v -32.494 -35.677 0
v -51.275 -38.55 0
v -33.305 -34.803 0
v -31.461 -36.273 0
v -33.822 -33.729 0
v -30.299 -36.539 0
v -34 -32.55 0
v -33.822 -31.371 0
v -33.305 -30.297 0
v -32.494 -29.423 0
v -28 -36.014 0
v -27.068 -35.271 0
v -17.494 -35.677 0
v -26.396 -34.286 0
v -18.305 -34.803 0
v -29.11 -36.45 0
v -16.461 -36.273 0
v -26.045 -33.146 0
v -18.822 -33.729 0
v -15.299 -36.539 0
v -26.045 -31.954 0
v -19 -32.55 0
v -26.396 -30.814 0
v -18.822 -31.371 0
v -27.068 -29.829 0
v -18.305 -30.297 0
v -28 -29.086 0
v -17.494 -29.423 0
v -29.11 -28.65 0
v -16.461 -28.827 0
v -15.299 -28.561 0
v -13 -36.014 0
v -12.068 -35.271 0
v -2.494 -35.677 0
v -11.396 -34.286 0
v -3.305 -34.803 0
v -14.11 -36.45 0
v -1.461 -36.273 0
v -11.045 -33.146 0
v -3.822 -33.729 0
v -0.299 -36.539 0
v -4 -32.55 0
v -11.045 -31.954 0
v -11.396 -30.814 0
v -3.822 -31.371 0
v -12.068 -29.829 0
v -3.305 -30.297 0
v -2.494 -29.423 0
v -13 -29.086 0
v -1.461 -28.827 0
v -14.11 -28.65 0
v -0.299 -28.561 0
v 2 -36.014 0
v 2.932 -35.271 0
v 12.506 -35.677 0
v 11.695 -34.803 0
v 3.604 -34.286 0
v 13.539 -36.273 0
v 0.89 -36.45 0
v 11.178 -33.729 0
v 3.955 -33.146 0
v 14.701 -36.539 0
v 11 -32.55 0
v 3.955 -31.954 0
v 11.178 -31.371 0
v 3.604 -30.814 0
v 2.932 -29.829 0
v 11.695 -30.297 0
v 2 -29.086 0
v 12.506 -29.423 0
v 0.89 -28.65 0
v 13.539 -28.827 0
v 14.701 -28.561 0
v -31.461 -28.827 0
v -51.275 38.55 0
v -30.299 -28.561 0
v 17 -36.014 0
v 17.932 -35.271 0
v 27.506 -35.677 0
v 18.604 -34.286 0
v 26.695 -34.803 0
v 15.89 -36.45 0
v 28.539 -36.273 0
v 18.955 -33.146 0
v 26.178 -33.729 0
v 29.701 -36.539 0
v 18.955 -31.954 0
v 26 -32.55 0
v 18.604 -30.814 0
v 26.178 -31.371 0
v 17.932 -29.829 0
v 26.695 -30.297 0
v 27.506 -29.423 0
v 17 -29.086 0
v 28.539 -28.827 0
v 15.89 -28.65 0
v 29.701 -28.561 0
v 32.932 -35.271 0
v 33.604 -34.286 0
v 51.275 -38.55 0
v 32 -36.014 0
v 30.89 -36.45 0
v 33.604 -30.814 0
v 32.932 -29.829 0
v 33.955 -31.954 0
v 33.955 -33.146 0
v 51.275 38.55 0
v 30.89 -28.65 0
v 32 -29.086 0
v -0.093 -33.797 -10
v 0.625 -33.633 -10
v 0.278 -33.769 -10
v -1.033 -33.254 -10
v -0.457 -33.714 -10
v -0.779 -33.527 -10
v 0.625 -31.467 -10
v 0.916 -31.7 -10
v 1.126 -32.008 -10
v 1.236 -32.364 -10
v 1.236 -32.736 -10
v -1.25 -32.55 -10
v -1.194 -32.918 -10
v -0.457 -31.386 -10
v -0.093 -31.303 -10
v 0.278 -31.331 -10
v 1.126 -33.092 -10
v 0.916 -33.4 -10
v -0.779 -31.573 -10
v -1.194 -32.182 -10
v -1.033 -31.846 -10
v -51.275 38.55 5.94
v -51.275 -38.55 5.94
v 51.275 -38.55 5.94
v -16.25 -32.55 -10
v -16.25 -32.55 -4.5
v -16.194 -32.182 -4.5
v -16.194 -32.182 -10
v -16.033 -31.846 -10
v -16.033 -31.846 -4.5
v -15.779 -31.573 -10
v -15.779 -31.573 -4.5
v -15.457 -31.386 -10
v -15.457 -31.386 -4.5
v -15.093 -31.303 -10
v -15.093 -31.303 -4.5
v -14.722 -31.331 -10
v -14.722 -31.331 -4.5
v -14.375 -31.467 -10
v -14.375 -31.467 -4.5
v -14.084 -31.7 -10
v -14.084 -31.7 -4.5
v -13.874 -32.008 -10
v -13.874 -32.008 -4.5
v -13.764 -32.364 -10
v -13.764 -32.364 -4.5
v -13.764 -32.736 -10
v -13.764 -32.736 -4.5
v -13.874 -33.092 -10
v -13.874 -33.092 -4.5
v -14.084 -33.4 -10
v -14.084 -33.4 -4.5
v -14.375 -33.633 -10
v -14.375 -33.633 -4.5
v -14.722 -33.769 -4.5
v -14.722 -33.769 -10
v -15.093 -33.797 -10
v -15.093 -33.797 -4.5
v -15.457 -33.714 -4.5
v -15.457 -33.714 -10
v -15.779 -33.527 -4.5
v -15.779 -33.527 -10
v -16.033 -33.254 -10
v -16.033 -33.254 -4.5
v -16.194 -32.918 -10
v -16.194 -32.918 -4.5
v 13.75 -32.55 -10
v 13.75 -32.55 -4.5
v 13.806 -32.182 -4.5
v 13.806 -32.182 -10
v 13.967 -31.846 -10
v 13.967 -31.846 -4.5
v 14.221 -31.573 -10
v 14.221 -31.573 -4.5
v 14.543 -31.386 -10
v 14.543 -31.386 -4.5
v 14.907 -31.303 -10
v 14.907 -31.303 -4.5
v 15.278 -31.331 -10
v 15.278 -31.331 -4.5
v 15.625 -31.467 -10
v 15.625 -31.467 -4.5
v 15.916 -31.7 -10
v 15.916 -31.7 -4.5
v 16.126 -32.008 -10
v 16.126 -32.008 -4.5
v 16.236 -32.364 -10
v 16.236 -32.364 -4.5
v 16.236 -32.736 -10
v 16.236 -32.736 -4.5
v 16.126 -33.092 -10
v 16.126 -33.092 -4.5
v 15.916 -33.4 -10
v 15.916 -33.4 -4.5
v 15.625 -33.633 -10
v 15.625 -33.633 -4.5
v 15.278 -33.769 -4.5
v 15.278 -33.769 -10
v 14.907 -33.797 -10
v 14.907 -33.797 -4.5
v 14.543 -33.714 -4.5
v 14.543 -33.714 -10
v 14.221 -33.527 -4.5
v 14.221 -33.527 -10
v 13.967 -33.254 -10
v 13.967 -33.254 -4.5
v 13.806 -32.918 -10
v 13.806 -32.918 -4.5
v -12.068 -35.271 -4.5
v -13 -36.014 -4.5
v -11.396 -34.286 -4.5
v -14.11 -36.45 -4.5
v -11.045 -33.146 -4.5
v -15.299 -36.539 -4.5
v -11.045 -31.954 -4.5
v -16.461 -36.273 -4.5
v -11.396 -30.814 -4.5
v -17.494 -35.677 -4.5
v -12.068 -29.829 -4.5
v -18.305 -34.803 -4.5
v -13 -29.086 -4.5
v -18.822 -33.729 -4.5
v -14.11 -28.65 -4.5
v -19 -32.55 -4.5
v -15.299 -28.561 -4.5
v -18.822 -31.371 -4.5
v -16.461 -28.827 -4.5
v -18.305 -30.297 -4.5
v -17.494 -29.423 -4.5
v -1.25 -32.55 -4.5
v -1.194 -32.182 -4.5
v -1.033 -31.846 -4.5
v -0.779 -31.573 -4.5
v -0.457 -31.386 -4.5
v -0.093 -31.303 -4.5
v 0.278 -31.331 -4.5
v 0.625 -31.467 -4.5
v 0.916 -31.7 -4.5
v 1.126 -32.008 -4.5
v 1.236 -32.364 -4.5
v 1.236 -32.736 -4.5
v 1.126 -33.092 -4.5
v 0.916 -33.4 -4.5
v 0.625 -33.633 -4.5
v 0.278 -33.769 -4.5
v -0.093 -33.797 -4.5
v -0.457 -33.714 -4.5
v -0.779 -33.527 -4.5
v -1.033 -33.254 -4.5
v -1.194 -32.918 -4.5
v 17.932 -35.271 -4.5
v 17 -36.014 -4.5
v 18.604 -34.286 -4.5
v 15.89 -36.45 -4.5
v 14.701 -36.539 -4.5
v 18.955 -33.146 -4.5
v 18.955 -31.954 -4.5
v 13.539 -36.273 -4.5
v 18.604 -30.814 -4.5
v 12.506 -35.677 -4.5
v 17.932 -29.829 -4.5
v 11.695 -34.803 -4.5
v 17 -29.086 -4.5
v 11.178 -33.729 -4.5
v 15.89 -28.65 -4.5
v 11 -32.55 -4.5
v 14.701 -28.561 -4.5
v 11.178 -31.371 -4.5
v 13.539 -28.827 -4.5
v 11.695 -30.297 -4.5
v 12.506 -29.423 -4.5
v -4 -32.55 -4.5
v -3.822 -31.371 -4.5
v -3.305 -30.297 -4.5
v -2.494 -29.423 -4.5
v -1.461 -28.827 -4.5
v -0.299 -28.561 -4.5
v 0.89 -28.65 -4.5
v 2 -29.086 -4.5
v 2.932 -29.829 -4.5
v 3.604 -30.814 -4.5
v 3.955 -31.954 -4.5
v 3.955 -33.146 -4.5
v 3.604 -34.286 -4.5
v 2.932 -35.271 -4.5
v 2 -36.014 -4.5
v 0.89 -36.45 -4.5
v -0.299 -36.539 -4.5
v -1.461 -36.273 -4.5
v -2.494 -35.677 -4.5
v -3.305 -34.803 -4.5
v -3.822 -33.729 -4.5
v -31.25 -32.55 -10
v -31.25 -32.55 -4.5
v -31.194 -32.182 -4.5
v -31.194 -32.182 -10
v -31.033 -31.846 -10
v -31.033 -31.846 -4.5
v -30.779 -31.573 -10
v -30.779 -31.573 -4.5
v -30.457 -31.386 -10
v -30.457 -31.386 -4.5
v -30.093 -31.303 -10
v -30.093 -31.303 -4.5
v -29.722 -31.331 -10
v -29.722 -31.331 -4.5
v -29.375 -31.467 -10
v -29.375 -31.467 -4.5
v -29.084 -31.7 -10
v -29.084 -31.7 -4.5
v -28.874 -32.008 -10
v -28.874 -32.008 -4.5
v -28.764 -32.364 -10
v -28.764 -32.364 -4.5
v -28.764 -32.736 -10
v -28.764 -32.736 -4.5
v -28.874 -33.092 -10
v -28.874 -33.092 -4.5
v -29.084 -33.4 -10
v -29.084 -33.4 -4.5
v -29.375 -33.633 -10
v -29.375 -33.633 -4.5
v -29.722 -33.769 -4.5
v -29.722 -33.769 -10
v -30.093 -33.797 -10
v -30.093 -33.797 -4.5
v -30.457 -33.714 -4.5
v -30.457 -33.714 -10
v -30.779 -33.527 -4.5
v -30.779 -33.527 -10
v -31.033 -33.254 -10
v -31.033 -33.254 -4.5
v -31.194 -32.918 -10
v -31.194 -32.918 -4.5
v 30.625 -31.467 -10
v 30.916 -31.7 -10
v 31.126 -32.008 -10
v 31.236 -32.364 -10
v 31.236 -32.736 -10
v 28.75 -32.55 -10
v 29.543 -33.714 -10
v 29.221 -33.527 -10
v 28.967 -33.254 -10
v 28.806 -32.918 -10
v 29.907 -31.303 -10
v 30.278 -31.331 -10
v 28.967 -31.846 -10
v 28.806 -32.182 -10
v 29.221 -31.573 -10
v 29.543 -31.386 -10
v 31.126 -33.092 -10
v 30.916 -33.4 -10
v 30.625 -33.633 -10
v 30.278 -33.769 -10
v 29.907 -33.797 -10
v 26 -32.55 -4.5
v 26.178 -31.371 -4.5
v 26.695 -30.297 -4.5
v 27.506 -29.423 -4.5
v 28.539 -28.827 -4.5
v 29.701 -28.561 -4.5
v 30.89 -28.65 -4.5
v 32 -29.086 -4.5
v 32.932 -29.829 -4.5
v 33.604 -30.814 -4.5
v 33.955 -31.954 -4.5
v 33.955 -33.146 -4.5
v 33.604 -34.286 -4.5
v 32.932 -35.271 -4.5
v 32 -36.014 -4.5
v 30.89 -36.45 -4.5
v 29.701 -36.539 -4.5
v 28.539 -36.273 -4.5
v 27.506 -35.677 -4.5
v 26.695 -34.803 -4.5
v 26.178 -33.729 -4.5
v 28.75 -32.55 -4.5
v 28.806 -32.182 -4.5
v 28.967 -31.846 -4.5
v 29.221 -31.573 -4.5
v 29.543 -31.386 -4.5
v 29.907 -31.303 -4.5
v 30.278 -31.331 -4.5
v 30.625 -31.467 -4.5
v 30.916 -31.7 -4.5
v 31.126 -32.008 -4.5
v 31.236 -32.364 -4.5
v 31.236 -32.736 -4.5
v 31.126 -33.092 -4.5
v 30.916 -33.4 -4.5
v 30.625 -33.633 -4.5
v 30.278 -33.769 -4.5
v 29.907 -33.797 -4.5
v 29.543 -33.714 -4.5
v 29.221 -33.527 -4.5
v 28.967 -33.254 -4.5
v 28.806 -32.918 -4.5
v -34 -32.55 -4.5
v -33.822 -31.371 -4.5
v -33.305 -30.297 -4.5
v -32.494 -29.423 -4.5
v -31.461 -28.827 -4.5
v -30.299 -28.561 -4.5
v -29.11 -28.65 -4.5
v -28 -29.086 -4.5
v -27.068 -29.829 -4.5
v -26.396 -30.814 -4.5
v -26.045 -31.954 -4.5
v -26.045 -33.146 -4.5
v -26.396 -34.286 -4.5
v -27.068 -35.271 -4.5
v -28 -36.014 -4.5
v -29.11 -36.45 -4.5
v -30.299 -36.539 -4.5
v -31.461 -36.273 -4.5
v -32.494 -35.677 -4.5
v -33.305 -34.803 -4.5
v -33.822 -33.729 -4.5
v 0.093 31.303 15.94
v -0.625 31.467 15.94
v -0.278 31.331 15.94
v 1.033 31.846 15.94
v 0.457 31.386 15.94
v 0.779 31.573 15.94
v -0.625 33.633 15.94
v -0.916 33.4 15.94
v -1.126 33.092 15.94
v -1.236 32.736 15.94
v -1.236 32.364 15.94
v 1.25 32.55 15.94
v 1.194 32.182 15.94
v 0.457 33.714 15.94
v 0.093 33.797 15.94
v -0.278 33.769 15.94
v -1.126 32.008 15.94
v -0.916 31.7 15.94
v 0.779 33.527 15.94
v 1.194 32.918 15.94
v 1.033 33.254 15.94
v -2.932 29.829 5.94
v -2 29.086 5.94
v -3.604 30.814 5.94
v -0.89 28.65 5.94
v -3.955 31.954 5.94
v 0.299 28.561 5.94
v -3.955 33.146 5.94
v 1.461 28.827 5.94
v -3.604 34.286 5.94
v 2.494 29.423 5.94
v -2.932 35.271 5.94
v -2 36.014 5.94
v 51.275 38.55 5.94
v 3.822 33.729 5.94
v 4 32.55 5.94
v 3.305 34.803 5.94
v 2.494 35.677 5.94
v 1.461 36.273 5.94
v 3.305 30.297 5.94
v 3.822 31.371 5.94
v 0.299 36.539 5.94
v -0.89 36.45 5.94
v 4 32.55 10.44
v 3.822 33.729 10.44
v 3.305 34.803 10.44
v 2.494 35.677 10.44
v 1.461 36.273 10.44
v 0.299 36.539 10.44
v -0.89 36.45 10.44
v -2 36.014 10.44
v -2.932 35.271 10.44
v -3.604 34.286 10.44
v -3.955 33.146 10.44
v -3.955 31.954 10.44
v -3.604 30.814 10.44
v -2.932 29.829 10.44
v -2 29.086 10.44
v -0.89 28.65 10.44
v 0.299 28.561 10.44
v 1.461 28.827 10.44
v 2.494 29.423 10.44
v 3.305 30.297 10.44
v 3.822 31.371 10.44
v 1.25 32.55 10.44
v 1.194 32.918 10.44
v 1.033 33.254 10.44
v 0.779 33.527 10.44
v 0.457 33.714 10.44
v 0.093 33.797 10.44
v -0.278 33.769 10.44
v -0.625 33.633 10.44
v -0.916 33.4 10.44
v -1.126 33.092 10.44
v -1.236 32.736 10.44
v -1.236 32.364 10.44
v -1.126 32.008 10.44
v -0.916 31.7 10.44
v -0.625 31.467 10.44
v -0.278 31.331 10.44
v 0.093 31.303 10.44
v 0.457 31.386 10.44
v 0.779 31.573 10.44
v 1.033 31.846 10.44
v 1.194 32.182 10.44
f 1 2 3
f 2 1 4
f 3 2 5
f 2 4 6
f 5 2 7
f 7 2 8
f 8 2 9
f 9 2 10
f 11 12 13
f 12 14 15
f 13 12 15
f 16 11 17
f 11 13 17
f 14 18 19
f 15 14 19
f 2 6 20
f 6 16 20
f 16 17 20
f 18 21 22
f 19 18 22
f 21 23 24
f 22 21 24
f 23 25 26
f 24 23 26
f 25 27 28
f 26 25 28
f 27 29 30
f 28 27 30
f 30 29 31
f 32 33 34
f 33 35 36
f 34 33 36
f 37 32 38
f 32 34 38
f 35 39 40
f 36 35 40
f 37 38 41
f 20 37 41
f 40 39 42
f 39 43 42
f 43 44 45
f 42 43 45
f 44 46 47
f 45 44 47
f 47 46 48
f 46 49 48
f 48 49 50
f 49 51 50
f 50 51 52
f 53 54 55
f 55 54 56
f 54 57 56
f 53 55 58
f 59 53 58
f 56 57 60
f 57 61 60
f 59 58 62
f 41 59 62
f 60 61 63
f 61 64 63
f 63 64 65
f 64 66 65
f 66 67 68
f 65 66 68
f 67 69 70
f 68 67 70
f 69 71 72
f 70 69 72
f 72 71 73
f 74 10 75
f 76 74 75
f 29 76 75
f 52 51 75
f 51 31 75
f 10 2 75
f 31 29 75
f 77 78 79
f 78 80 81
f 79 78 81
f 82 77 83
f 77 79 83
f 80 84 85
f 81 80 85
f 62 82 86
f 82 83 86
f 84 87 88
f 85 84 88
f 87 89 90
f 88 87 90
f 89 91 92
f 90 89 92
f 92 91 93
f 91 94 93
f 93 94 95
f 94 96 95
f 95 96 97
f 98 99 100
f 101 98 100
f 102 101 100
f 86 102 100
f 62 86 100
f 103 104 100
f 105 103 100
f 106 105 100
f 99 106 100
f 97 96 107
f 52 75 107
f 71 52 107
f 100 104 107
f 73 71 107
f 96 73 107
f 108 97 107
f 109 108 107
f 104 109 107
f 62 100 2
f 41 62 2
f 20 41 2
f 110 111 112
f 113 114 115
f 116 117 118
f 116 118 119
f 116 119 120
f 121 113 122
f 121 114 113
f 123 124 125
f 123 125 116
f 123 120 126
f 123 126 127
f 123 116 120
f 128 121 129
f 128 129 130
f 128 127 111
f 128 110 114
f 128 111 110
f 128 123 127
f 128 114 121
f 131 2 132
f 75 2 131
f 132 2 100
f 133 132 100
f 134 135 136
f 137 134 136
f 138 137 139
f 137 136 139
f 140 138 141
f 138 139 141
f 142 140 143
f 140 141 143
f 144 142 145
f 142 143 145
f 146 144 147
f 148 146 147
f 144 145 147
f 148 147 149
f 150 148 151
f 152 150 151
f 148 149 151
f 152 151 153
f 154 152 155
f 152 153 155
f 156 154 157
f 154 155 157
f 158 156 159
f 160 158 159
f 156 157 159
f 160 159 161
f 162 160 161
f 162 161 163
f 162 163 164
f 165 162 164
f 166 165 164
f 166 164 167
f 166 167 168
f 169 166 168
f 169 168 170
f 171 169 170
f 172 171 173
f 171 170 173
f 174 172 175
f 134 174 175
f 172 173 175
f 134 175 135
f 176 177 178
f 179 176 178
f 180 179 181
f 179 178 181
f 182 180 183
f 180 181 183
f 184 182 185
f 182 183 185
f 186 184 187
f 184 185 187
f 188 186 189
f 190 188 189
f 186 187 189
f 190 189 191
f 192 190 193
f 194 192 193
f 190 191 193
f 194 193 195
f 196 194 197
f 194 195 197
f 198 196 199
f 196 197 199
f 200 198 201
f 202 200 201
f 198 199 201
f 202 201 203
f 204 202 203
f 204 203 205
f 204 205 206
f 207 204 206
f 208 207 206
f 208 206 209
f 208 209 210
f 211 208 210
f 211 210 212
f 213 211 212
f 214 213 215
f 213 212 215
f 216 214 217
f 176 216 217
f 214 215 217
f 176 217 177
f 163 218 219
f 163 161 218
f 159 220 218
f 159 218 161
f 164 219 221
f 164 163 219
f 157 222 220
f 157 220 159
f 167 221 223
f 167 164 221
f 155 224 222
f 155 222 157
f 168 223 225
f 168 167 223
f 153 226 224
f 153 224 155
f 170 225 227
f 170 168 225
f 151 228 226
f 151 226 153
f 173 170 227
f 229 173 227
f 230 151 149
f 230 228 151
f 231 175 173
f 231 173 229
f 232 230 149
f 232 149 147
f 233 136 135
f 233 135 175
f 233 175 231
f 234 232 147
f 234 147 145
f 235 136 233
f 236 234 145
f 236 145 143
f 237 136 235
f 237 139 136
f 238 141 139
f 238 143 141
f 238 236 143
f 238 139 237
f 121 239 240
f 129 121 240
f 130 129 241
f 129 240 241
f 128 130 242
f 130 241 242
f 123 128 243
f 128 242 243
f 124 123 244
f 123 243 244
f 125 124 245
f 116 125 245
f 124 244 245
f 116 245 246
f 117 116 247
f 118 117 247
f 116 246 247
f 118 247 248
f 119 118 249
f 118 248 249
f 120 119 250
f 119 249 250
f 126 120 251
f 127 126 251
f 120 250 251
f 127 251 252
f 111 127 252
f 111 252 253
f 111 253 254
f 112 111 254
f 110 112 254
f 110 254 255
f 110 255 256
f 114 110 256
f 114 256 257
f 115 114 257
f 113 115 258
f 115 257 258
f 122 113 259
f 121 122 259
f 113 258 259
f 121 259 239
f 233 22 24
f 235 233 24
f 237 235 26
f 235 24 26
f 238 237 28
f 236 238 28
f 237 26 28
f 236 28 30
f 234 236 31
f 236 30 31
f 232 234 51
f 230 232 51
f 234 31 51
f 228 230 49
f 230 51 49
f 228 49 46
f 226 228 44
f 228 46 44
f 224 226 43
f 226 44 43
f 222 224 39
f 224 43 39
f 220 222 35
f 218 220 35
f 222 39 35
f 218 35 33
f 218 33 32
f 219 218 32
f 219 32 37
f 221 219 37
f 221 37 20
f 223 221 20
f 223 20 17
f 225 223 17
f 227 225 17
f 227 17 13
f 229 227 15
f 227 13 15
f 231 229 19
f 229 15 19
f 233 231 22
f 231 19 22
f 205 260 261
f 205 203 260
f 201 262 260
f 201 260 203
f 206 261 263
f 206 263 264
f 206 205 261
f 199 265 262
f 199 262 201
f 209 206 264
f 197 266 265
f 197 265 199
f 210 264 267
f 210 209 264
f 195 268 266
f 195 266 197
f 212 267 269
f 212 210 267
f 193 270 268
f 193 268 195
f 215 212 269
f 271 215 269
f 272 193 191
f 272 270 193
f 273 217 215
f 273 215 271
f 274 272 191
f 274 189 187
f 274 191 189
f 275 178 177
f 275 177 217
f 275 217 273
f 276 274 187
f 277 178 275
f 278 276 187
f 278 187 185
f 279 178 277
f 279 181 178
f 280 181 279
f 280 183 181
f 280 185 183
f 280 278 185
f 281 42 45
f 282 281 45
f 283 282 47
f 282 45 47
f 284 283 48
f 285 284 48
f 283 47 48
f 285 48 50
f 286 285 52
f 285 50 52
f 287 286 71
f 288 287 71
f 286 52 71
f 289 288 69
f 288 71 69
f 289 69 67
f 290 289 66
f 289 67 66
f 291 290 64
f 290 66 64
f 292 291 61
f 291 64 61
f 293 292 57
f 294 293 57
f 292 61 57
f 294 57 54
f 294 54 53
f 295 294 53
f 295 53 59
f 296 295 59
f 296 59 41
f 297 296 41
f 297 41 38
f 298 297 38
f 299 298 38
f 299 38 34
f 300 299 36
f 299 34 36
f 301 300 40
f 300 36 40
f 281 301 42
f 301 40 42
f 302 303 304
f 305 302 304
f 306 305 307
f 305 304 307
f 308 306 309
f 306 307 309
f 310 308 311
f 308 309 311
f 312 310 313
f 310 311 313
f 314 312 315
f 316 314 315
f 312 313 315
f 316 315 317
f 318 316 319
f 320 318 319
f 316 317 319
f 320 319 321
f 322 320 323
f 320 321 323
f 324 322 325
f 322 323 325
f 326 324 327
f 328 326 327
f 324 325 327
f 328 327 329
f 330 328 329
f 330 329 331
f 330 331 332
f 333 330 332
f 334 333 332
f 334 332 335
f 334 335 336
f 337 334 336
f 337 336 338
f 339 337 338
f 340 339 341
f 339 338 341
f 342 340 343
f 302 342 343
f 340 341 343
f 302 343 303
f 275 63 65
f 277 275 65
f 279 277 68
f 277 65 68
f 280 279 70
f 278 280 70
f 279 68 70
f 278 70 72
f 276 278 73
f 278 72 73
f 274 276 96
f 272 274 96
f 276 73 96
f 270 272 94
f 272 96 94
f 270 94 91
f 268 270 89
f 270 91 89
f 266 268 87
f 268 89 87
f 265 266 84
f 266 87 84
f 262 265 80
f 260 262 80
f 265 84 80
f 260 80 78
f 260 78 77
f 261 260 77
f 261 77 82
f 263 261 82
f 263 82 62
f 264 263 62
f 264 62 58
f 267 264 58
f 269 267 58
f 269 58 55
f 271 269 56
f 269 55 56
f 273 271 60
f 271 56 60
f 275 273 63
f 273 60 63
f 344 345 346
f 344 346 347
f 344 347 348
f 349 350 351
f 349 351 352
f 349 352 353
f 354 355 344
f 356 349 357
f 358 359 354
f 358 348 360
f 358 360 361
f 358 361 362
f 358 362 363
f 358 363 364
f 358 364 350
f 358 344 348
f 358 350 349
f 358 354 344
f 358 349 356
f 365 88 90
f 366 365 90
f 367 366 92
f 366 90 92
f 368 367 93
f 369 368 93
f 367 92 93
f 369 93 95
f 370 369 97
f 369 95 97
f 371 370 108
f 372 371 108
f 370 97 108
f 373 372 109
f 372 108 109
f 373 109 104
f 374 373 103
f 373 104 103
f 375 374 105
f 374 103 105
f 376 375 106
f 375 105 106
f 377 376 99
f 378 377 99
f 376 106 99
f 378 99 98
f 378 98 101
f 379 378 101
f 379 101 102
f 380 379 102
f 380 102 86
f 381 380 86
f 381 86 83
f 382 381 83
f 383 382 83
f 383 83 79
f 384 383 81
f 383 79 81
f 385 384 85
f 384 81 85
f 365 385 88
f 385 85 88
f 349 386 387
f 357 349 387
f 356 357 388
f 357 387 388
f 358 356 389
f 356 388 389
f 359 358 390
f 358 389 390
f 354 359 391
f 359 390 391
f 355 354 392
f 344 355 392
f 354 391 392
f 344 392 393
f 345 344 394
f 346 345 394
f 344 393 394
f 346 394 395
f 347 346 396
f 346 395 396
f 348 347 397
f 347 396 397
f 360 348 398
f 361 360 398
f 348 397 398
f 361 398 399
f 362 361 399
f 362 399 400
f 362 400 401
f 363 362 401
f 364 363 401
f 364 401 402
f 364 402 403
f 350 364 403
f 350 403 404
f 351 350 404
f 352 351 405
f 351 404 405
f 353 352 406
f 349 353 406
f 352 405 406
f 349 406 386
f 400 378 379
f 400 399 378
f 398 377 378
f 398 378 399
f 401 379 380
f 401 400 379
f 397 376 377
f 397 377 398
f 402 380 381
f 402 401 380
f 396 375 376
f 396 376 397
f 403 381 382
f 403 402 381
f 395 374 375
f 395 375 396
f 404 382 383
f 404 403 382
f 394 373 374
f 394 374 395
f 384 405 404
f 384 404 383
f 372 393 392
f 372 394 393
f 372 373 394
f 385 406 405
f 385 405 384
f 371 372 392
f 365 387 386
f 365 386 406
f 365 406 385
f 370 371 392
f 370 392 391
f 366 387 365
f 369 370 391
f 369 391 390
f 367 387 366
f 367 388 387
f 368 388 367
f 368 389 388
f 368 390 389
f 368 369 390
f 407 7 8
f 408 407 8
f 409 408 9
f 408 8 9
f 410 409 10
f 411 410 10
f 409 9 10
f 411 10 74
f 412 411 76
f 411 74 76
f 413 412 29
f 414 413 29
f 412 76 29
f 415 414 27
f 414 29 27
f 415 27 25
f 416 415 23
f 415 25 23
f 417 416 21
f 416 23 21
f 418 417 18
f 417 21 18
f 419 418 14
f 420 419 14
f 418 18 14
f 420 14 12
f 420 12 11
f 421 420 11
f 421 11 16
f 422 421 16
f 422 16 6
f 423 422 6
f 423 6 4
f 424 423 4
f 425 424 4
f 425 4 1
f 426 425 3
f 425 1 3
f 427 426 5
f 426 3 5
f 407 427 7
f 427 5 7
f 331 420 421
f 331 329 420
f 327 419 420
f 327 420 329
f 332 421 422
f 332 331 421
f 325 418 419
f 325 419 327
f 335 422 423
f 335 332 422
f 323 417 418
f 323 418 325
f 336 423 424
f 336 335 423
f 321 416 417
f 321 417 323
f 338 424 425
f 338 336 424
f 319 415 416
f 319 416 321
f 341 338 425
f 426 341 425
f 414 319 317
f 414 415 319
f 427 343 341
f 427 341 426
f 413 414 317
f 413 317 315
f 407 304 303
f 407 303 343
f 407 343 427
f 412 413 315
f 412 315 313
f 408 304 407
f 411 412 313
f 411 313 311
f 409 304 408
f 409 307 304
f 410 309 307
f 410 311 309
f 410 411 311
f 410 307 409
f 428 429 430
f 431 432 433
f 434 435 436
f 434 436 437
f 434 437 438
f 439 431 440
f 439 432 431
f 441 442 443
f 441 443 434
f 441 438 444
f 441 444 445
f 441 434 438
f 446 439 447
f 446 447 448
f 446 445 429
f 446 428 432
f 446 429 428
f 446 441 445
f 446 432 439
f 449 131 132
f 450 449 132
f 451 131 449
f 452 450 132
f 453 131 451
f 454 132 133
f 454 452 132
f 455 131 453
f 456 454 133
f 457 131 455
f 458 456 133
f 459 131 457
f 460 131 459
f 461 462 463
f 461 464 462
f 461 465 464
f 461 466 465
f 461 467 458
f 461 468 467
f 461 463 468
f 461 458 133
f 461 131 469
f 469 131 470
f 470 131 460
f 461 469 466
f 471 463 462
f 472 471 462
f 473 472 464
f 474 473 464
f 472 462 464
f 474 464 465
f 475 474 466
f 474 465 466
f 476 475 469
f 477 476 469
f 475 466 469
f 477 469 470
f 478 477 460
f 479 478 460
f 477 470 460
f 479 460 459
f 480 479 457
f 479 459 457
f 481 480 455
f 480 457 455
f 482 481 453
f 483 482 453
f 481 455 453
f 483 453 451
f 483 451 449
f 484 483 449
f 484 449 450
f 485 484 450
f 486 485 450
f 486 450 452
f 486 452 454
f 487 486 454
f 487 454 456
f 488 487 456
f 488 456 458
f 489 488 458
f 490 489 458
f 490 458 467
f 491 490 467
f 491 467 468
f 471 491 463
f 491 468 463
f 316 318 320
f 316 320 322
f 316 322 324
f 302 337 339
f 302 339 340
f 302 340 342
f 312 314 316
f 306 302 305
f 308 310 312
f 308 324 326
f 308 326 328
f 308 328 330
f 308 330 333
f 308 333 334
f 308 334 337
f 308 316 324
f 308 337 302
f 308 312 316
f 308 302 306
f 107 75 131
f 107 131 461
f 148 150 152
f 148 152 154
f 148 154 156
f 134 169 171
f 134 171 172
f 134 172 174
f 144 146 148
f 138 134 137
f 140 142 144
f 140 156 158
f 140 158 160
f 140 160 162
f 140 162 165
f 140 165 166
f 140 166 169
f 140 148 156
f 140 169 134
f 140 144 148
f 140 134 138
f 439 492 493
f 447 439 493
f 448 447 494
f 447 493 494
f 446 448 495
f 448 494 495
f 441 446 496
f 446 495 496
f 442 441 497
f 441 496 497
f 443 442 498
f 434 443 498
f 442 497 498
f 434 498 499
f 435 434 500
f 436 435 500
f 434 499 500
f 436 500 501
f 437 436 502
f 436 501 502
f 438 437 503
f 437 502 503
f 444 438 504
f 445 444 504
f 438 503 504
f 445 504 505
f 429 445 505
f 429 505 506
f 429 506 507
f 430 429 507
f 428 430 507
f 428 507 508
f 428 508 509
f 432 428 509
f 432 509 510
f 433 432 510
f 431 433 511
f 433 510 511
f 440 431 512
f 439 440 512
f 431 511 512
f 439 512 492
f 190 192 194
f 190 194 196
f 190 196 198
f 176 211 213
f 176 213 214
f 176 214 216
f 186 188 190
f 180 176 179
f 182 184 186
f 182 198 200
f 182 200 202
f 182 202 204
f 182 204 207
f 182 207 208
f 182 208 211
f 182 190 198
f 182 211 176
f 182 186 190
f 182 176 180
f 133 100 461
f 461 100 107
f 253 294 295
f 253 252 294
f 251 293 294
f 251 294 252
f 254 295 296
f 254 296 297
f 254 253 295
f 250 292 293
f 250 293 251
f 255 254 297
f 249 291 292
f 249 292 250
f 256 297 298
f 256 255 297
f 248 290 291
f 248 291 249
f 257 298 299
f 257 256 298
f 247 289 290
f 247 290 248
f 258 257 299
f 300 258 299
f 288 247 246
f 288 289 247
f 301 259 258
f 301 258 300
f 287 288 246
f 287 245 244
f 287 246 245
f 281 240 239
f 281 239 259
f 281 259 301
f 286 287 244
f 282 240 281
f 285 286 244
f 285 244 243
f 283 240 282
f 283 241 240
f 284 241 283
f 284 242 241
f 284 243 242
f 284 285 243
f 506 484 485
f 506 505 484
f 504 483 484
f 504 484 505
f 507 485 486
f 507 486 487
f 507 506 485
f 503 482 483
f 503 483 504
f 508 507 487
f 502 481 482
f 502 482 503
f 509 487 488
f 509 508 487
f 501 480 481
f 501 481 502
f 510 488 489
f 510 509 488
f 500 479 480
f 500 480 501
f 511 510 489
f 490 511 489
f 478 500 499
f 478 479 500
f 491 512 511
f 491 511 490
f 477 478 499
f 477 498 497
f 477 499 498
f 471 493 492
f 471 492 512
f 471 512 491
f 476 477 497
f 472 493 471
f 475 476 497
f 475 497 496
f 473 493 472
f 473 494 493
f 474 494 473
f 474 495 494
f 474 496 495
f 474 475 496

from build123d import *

# Parameters (mm, degrees)
SKETCH1_W           = 102.55
SKETCH1_H           = 77.1
BOSS_EXTRUDE1_DEPTH = 5.94
SKETCH2_R           = 4
BOSS_EXTRUDE2_DEPTH = 4.5
SKETCH3_R           = 1.25
BOSS_EXTRUDE3_DEPTH = 5.5
SKETCH5_R           = 4
BOSS_EXTRUDE4_DEPTH = 4.5
SKETCH6_R           = 1.25
BOSS_EXTRUDE5_DEPTH = 5.5


with BuildPart() as part:
    # Sketch1 → Boss-Extrude1 (new body)
    with BuildSketch(Plane.XY):
        Rectangle(SKETCH1_W, SKETCH1_H)
    extrude(amount=BOSS_EXTRUDE1_DEPTH)

    # Sketch2 → Boss-Extrude2 (add)
    with BuildSketch(Plane(origin=(0, 0, 0), x_dir=(-1, 0, 0), z_dir=(0, 0, -1))):
        with Locations((-30, -32.55)):
            Circle(SKETCH2_R)
        with Locations((-15, -32.55)):
            Circle(SKETCH2_R)
        with Locations((0, -32.55)):
            Circle(SKETCH2_R)
        with Locations((15, -32.55)):
            Circle(SKETCH2_R)
        with Locations((30, -32.55)):
            Circle(SKETCH2_R)
    extrude(amount=BOSS_EXTRUDE2_DEPTH)

    # Sketch3 → Boss-Extrude3 (add)
    with BuildSketch(Plane(origin=(0, 0, -4.5), x_dir=(-1, 0, 0), z_dir=(0, 0, -1))):
        with Locations((-30, -32.55)):
            Circle(SKETCH3_R)
        with Locations((-15, -32.55)):
            Circle(SKETCH3_R)
        with Locations((0, -32.55)):
            Circle(SKETCH3_R)
        with Locations((15, -32.55)):
            Circle(SKETCH3_R)
        with Locations((30, -32.55)):
            Circle(SKETCH3_R)
    extrude(amount=BOSS_EXTRUDE3_DEPTH)

    # Sketch5 → Boss-Extrude4 (add)
    with BuildSketch(Plane.XY.offset(5.94)):
        with Locations((0, 32.55)):
            Circle(SKETCH5_R)
    extrude(amount=BOSS_EXTRUDE4_DEPTH)

    # Sketch6 → Boss-Extrude5 (add)
    with BuildSketch(Plane.XY.offset(10.44)):
        with Locations((0, 32.55)):
            Circle(SKETCH6_R)
    extrude(amount=BOSS_EXTRUDE5_DEPTH)


solid = part.part
